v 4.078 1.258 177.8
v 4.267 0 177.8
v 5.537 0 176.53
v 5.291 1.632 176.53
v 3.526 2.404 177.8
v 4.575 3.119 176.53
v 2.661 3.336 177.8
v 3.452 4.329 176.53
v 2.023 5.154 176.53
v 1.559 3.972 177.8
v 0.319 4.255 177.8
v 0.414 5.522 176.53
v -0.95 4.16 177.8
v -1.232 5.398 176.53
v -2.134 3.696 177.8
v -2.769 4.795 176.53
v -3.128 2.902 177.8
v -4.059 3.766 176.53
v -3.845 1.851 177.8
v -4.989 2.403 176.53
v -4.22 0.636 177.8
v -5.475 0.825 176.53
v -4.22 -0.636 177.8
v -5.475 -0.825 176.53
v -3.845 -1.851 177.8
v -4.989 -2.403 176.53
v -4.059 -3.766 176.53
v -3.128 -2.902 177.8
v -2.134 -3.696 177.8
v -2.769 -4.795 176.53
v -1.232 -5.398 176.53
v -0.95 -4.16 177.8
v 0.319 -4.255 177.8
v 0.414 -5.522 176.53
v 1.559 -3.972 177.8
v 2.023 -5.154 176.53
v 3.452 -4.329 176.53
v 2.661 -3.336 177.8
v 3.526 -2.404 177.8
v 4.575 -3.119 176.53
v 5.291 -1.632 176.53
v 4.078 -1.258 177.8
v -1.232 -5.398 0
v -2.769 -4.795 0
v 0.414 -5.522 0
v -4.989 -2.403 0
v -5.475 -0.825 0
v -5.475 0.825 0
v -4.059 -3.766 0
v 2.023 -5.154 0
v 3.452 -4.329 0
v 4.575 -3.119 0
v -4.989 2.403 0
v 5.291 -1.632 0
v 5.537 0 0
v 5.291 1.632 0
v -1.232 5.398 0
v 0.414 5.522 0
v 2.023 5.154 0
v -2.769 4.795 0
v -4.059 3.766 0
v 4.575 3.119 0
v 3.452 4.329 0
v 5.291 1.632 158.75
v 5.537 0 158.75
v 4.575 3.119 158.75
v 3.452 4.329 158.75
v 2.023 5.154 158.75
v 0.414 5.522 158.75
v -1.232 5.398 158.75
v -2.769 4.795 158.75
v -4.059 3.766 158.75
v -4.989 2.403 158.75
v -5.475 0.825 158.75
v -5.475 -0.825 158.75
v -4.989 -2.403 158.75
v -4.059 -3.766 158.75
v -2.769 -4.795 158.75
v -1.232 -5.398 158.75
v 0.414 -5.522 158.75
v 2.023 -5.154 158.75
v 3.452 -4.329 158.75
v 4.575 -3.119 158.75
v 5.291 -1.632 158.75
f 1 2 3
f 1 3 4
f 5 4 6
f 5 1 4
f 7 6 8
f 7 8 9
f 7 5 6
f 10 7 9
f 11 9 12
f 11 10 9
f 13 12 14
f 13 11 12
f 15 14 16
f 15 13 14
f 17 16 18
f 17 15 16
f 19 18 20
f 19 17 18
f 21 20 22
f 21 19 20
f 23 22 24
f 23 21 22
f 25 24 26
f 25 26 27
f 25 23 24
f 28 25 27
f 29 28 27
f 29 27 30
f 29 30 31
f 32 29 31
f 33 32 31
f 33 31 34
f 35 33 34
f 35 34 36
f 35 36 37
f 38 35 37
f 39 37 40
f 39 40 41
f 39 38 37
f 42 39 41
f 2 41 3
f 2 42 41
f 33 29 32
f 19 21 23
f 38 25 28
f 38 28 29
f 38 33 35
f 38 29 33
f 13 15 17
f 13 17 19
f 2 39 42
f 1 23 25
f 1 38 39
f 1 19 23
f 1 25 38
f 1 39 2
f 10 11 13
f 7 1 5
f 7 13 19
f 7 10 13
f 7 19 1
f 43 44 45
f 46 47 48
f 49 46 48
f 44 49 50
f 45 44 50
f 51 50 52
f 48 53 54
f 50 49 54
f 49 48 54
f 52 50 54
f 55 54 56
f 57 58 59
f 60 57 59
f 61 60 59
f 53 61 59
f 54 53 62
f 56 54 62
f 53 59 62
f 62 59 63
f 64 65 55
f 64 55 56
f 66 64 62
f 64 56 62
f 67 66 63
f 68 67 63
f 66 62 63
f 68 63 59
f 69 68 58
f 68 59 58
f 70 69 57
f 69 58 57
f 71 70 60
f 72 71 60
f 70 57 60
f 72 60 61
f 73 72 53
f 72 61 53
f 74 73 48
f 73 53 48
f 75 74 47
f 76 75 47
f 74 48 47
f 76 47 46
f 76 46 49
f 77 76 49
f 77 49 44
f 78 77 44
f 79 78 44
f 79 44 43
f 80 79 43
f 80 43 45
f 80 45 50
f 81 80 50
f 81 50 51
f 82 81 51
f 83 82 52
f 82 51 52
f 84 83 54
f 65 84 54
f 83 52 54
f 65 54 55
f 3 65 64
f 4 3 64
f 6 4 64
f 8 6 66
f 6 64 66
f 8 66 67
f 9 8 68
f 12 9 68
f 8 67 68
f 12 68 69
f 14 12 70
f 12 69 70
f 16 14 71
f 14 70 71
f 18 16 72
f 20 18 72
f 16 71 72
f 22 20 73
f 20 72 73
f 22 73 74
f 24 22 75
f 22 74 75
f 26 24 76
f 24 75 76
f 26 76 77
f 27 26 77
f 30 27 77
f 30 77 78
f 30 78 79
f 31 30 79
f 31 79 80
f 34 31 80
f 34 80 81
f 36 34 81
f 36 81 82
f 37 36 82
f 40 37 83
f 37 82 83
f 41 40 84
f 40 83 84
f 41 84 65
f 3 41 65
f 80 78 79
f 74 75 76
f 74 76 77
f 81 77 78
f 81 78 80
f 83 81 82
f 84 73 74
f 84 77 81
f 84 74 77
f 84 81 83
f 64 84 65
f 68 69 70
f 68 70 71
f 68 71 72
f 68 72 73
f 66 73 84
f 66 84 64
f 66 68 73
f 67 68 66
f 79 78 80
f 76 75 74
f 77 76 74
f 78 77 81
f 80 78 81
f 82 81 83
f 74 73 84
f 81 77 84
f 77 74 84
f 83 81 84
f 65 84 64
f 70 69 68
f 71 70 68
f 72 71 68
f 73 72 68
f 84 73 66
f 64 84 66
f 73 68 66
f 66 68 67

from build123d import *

# Parameters (mm, degrees)
SKETCH1_R           = 5.5372
BOSS_EXTRUDE1_DEPTH = 158.75
SKETCH2_R           = 5.5372
BOSS_EXTRUDE2_DEPTH = 19.05
CHAMFER1_SIZE       = 1.27


with BuildPart() as part:
    # Sketch1 → Boss-Extrude1 (new body)
    with BuildSketch(Plane.XY):
        Circle(SKETCH1_R)
    extrude(amount=BOSS_EXTRUDE1_DEPTH)


with BuildPart() as body_2:
    # Sketch2 → Boss-Extrude2 (new body)
    with BuildSketch(Plane.XY.offset(158.75)):
        Circle(SKETCH2_R)
    extrude(amount=BOSS_EXTRUDE2_DEPTH)

    # Chamfer1
    chamfer1_edges = [body_2.edges().sort_by_distance(p)[0] for p in [
        (-5.5372, 0, 177.8),
    ]]
    chamfer(chamfer1_edges, length=CHAMFER1_SIZE)


solid = Compound([part.part, body_2.part])
